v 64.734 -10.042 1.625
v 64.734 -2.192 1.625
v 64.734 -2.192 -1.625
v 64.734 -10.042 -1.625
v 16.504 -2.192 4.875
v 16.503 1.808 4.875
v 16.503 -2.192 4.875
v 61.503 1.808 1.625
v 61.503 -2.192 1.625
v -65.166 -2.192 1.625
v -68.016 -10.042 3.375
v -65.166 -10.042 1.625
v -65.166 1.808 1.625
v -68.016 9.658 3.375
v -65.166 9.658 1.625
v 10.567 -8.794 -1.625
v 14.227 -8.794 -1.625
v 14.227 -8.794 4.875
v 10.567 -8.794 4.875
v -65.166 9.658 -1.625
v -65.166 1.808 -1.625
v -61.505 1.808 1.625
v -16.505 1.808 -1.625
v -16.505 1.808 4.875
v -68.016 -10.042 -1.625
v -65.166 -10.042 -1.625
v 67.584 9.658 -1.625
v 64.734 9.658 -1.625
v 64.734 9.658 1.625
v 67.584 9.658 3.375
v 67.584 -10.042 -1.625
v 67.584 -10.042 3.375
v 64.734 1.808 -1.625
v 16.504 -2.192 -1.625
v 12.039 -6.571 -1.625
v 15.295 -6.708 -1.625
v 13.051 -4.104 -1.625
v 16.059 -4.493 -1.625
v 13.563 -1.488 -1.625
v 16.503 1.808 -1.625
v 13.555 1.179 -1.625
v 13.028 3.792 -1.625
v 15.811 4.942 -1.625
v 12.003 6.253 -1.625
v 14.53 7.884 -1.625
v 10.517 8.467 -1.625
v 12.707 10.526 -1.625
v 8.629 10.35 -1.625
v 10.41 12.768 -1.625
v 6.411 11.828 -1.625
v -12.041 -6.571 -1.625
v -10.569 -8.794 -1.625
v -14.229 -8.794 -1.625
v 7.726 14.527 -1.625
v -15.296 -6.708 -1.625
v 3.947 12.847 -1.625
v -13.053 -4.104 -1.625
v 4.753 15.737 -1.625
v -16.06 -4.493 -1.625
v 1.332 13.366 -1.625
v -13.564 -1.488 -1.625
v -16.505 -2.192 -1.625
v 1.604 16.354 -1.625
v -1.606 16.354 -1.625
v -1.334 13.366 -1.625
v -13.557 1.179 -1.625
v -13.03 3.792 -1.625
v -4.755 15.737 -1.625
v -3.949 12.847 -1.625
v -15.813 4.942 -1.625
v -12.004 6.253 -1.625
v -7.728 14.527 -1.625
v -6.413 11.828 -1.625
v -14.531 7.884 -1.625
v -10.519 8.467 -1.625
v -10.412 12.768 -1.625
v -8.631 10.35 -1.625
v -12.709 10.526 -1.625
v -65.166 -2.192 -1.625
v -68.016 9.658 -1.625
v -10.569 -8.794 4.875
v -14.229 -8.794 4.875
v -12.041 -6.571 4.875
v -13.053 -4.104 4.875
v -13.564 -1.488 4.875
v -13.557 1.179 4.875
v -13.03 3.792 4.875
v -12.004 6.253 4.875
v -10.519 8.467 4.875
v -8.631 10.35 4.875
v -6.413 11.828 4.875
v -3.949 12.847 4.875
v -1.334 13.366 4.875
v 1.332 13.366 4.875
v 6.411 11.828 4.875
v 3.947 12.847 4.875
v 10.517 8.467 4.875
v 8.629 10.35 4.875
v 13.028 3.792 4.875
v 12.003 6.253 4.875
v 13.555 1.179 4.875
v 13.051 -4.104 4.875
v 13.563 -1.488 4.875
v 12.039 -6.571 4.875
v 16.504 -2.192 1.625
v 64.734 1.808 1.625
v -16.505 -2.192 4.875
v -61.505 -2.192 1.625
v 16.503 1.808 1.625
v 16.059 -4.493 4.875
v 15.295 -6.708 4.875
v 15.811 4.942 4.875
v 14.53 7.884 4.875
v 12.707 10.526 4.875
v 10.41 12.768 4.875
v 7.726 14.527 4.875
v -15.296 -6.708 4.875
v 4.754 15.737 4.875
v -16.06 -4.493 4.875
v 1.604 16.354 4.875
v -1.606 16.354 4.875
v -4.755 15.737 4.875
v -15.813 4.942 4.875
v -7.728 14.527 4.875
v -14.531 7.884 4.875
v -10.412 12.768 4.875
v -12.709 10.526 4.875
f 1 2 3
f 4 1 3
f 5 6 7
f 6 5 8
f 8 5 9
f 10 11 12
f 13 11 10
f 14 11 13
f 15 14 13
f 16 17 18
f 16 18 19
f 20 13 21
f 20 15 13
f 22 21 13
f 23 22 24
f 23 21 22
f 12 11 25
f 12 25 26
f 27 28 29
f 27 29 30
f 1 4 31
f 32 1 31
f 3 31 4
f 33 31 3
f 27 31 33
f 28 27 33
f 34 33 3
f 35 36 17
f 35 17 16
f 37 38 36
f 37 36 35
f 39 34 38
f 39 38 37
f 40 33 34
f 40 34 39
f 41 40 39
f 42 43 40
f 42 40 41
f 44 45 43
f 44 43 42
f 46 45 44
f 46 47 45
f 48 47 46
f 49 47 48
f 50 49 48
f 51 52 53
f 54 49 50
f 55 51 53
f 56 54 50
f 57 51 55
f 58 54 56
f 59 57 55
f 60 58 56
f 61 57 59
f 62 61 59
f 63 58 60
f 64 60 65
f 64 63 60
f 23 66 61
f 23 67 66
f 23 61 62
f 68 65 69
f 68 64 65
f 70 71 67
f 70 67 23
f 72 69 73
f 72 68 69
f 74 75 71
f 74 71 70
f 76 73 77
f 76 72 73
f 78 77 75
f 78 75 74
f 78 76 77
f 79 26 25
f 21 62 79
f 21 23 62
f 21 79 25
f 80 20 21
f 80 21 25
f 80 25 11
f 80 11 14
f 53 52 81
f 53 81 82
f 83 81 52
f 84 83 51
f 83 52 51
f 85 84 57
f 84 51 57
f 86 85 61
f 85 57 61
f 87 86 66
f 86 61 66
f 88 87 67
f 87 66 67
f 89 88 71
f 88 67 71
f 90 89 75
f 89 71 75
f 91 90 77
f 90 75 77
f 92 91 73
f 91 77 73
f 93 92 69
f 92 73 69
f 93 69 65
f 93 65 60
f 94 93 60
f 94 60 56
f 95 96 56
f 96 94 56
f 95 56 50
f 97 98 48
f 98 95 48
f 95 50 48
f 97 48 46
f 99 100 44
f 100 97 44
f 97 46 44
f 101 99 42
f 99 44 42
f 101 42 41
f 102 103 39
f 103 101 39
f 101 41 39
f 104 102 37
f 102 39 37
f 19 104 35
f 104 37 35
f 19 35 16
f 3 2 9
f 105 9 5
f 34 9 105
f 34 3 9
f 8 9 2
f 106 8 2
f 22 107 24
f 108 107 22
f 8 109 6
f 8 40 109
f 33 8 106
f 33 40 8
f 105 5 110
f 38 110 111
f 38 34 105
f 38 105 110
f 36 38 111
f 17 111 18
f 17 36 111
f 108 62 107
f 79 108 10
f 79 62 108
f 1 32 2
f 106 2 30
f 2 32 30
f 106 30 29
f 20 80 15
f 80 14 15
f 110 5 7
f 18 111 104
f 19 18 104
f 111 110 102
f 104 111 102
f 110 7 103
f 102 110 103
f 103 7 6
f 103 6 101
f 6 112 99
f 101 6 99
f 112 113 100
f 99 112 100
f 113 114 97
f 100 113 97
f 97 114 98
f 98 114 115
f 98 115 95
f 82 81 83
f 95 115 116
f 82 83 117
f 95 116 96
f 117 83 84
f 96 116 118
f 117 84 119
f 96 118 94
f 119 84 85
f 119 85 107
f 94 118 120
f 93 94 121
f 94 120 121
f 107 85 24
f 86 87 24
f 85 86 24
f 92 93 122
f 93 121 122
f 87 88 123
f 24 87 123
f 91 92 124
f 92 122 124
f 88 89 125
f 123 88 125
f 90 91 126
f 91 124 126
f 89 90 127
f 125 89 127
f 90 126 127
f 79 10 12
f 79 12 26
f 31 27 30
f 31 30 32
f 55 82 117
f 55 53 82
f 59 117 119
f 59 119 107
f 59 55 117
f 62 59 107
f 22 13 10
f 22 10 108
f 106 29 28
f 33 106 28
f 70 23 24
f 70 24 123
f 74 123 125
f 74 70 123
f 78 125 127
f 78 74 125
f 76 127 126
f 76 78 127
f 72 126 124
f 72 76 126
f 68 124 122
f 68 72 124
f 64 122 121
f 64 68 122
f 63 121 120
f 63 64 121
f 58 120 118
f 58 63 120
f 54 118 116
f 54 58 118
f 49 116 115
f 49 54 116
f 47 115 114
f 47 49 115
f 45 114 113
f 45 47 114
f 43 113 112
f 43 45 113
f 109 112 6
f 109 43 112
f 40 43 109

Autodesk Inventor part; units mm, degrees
ref_plane "YZ Plane" through (0, 0, 0) normal (1, 0, 0) x (0, 1, 0)
ref_plane "XZ Plane" through (0, 0, 0) normal (0, 1, 0) x (-1, 0, 0)
ref_plane "XY Plane" through (0, 0, 0) normal (0, 0, 1) x (1, 0, 0)
sketch "Skizze1" plane through (0, 0, 0) normal (0, 0, 1) x (1, 0, 0)
  line L0 (-68.016, 1.808) -> (67.584, 1.808)
  line L1 (67.584, 1.808) -> (67.584, -2.192)
  line L2 (67.584, -2.192) -> (-68.016, -2.192)
  line L3 (-68.016, -2.192) -> (-68.016, 1.808)
  line L4 (-68.016, 1.808) -> (67.584, -2.192) construction
  line L5 (67.584, 1.808) -> (-68.016, -2.192) construction
  point P0 (0, 0)
  point P1 (-0.216, -0.192)
  point P2 (-0.216, -0.192)
  dimension "d0" = 135.6
  dimension "d1" = 4
extrude "Extrusion1" add sketch "Skizze1" along normal mid plane 3.25
ref_plane "Arbeitsebene1" through (-68.016, -0.192, 1.625) normal (0, -1, 0) x (1, 0, 0)
sketch "Skizze2" plane through (-68.016, -0.192, 1.625) normal (0, -1, 0) x (1, 0, 0)
  line L0 (0, -3.25) -> (0, 0) projected
  line L1 (0, -3.25) -> (135.6, -3.25) projected
  line L2 (0, 0) -> (2.85, 0)
  line L3 (2.85, 0) -> (2.85, -3.25)
  line L4 (2.85, -3.25) -> (0, -3.25)
  line L5 (0, -3.25) -> (0, 0)
  line L6 (0, 0) -> (0, 1.75)
  line L7 (0, 1.75) -> (2.85, 0)
  line L8 (135.6, -3.25) -> (135.6, 0) projected
  line L9 (135.6, 0) -> (132.75, 0)
  line L10 (132.75, 0) -> (132.75, -3.25)
  line L11 (132.75, -3.25) -> (135.6, -3.25)
  line L12 (135.6, -3.25) -> (135.6, 0)
  line L13 (135.6, 0) -> (135.6, 1.75)
  line L14 (135.6, 1.75) -> (132.75, 0)
  point P0 (68.016, -1.625)
  dimension "d4" = 2.85
  dimension "d5" = 1.75
  dimension "d6" = 2.85
extrude "Extrusion2" add sketch "Skizze2" along normal mid plane 19.7
sketch "Skizze3" plane through (0, 0, 1.625) normal (0, 0, 1) x (1, 0, 0)
  circle A0 centre (0, 0) radius 16
  dimension "d9" = 32
extrude "Extrusion3" cut sketch "Skizze3" against normal through all
sketch "Skizze4" plane through (0, 0, -1.625) normal (0, 0, -1) x (-1, 0, 0)
  line L0 (0.0777, -0.1628) -> (6.2277, -0.1628) construction
  circle A0 centre (0.0009, -0.1935) radius 13.625
  circle A1 centre (0.0009, -0.1935) radius 16.625
  line L1 (-22.383, -8.7935) -> (26.817, -8.7935)
  point P0 (-16.6241, -0.1935)
  point P1 (16.6259, -0.1935)
  point P2 (10.5688, -8.7935)
  point P3 (14.2287, -8.7935)
  point P4 (-14.2269, -8.7935)
  point P5 (-10.567, -8.7935)
  dimension "d27" = 3
  dimension "d28" = 27.25
  dimension "d29" = 8.6
extrude "Extrusion4" add sketch "Skizze4" against normal blind 6.5 contours A0 L1 A1 picked at (15.3303, 2.2297)
sketch "Skizze7" plane through (0, 0, 1.625) normal (0, 0, 1) x (1, 0, 0)
  line L0 (-65.166, 1.808) -> (-16.5049, 1.808) projected
  line L1 (-16.5053, -2.192) -> (-65.166, -2.192) projected
  line L2 (-16.5049, 1.808) -> (-61.5049, 1.808)
  line L3 (-61.5049, 1.808) -> (-61.5049, -2.192)
  line L4 (-61.5049, -2.192) -> (-16.5049, -2.192)
  line L5 (-16.5049, -2.192) -> (-16.5049, 1.808)
  line L6 (16.5032, 1.808) -> (64.734, 1.808) projected
  line L7 (64.734, -2.192) -> (16.5036, -2.192) projected
  line L8 (16.5032, 1.808) -> (61.5032, 1.808)
  line L9 (61.5032, 1.808) -> (61.5032, -2.192)
  line L10 (61.5032, -2.192) -> (16.5032, -2.192)
  line L11 (16.5032, -2.192) -> (16.5032, 1.808)
  point P0 (0, 0)
  point P1 (-61.5049, 1.808)
  point P2 (16.5036, -2.192)
  point P3 (61.5032, 1.808)
  dimension "d30" = 45
  dimension "d31" = 45
extrude "Extrusion7" add sketch "Skizze7" along normal blind 3.25
sketch "Skizze8" plane through (-65.166, -2.192, -1.625) normal (0, -1, 0) x (1, 0, 0)
  line L0 (48.661, 6.5) -> (3.661, 6.5) projected
  line L1 (48.661, 6.5) -> (48.661, 0) projected
  line L2 (3.661, 6.5) -> (48.661, 6.5)
  line L3 (48.661, 6.5) -> (48.661, 3.25)
  line L4 (48.661, 3.25) -> (3.661, 3.25)
  line L5 (3.661, 3.25) -> (3.661, 6.5)
  line L6 (126.6692, 3.25) -> (126.6692, 6.5) projected
  line L7 (81.6692, 6.5) -> (81.6692, 0) projected
  line L8 (126.6692, 6.5) -> (81.6692, 6.5)
  line L9 (81.6692, 6.5) -> (81.6692, 3.25)
  line L10 (81.6692, 3.25) -> (126.6692, 3.25)
  line L11 (126.6692, 3.25) -> (126.6692, 6.5)
  line L12 (81.6692, 6.5) -> (126.6692, 3.25)
  line L13 (50.9373, 6.5) -> (48.6607, 6.5) projected
  line L14 (48.6607, 6.5) -> (3.661, 3.25)
  point P0 (65.166, 1.625)
extrude "Extrusion8" cut sketch "Skizze8" against normal through all contours L14 L5 L0 | L12 L8 L6
properties part number "2024_08_28_Holder_GL25"
